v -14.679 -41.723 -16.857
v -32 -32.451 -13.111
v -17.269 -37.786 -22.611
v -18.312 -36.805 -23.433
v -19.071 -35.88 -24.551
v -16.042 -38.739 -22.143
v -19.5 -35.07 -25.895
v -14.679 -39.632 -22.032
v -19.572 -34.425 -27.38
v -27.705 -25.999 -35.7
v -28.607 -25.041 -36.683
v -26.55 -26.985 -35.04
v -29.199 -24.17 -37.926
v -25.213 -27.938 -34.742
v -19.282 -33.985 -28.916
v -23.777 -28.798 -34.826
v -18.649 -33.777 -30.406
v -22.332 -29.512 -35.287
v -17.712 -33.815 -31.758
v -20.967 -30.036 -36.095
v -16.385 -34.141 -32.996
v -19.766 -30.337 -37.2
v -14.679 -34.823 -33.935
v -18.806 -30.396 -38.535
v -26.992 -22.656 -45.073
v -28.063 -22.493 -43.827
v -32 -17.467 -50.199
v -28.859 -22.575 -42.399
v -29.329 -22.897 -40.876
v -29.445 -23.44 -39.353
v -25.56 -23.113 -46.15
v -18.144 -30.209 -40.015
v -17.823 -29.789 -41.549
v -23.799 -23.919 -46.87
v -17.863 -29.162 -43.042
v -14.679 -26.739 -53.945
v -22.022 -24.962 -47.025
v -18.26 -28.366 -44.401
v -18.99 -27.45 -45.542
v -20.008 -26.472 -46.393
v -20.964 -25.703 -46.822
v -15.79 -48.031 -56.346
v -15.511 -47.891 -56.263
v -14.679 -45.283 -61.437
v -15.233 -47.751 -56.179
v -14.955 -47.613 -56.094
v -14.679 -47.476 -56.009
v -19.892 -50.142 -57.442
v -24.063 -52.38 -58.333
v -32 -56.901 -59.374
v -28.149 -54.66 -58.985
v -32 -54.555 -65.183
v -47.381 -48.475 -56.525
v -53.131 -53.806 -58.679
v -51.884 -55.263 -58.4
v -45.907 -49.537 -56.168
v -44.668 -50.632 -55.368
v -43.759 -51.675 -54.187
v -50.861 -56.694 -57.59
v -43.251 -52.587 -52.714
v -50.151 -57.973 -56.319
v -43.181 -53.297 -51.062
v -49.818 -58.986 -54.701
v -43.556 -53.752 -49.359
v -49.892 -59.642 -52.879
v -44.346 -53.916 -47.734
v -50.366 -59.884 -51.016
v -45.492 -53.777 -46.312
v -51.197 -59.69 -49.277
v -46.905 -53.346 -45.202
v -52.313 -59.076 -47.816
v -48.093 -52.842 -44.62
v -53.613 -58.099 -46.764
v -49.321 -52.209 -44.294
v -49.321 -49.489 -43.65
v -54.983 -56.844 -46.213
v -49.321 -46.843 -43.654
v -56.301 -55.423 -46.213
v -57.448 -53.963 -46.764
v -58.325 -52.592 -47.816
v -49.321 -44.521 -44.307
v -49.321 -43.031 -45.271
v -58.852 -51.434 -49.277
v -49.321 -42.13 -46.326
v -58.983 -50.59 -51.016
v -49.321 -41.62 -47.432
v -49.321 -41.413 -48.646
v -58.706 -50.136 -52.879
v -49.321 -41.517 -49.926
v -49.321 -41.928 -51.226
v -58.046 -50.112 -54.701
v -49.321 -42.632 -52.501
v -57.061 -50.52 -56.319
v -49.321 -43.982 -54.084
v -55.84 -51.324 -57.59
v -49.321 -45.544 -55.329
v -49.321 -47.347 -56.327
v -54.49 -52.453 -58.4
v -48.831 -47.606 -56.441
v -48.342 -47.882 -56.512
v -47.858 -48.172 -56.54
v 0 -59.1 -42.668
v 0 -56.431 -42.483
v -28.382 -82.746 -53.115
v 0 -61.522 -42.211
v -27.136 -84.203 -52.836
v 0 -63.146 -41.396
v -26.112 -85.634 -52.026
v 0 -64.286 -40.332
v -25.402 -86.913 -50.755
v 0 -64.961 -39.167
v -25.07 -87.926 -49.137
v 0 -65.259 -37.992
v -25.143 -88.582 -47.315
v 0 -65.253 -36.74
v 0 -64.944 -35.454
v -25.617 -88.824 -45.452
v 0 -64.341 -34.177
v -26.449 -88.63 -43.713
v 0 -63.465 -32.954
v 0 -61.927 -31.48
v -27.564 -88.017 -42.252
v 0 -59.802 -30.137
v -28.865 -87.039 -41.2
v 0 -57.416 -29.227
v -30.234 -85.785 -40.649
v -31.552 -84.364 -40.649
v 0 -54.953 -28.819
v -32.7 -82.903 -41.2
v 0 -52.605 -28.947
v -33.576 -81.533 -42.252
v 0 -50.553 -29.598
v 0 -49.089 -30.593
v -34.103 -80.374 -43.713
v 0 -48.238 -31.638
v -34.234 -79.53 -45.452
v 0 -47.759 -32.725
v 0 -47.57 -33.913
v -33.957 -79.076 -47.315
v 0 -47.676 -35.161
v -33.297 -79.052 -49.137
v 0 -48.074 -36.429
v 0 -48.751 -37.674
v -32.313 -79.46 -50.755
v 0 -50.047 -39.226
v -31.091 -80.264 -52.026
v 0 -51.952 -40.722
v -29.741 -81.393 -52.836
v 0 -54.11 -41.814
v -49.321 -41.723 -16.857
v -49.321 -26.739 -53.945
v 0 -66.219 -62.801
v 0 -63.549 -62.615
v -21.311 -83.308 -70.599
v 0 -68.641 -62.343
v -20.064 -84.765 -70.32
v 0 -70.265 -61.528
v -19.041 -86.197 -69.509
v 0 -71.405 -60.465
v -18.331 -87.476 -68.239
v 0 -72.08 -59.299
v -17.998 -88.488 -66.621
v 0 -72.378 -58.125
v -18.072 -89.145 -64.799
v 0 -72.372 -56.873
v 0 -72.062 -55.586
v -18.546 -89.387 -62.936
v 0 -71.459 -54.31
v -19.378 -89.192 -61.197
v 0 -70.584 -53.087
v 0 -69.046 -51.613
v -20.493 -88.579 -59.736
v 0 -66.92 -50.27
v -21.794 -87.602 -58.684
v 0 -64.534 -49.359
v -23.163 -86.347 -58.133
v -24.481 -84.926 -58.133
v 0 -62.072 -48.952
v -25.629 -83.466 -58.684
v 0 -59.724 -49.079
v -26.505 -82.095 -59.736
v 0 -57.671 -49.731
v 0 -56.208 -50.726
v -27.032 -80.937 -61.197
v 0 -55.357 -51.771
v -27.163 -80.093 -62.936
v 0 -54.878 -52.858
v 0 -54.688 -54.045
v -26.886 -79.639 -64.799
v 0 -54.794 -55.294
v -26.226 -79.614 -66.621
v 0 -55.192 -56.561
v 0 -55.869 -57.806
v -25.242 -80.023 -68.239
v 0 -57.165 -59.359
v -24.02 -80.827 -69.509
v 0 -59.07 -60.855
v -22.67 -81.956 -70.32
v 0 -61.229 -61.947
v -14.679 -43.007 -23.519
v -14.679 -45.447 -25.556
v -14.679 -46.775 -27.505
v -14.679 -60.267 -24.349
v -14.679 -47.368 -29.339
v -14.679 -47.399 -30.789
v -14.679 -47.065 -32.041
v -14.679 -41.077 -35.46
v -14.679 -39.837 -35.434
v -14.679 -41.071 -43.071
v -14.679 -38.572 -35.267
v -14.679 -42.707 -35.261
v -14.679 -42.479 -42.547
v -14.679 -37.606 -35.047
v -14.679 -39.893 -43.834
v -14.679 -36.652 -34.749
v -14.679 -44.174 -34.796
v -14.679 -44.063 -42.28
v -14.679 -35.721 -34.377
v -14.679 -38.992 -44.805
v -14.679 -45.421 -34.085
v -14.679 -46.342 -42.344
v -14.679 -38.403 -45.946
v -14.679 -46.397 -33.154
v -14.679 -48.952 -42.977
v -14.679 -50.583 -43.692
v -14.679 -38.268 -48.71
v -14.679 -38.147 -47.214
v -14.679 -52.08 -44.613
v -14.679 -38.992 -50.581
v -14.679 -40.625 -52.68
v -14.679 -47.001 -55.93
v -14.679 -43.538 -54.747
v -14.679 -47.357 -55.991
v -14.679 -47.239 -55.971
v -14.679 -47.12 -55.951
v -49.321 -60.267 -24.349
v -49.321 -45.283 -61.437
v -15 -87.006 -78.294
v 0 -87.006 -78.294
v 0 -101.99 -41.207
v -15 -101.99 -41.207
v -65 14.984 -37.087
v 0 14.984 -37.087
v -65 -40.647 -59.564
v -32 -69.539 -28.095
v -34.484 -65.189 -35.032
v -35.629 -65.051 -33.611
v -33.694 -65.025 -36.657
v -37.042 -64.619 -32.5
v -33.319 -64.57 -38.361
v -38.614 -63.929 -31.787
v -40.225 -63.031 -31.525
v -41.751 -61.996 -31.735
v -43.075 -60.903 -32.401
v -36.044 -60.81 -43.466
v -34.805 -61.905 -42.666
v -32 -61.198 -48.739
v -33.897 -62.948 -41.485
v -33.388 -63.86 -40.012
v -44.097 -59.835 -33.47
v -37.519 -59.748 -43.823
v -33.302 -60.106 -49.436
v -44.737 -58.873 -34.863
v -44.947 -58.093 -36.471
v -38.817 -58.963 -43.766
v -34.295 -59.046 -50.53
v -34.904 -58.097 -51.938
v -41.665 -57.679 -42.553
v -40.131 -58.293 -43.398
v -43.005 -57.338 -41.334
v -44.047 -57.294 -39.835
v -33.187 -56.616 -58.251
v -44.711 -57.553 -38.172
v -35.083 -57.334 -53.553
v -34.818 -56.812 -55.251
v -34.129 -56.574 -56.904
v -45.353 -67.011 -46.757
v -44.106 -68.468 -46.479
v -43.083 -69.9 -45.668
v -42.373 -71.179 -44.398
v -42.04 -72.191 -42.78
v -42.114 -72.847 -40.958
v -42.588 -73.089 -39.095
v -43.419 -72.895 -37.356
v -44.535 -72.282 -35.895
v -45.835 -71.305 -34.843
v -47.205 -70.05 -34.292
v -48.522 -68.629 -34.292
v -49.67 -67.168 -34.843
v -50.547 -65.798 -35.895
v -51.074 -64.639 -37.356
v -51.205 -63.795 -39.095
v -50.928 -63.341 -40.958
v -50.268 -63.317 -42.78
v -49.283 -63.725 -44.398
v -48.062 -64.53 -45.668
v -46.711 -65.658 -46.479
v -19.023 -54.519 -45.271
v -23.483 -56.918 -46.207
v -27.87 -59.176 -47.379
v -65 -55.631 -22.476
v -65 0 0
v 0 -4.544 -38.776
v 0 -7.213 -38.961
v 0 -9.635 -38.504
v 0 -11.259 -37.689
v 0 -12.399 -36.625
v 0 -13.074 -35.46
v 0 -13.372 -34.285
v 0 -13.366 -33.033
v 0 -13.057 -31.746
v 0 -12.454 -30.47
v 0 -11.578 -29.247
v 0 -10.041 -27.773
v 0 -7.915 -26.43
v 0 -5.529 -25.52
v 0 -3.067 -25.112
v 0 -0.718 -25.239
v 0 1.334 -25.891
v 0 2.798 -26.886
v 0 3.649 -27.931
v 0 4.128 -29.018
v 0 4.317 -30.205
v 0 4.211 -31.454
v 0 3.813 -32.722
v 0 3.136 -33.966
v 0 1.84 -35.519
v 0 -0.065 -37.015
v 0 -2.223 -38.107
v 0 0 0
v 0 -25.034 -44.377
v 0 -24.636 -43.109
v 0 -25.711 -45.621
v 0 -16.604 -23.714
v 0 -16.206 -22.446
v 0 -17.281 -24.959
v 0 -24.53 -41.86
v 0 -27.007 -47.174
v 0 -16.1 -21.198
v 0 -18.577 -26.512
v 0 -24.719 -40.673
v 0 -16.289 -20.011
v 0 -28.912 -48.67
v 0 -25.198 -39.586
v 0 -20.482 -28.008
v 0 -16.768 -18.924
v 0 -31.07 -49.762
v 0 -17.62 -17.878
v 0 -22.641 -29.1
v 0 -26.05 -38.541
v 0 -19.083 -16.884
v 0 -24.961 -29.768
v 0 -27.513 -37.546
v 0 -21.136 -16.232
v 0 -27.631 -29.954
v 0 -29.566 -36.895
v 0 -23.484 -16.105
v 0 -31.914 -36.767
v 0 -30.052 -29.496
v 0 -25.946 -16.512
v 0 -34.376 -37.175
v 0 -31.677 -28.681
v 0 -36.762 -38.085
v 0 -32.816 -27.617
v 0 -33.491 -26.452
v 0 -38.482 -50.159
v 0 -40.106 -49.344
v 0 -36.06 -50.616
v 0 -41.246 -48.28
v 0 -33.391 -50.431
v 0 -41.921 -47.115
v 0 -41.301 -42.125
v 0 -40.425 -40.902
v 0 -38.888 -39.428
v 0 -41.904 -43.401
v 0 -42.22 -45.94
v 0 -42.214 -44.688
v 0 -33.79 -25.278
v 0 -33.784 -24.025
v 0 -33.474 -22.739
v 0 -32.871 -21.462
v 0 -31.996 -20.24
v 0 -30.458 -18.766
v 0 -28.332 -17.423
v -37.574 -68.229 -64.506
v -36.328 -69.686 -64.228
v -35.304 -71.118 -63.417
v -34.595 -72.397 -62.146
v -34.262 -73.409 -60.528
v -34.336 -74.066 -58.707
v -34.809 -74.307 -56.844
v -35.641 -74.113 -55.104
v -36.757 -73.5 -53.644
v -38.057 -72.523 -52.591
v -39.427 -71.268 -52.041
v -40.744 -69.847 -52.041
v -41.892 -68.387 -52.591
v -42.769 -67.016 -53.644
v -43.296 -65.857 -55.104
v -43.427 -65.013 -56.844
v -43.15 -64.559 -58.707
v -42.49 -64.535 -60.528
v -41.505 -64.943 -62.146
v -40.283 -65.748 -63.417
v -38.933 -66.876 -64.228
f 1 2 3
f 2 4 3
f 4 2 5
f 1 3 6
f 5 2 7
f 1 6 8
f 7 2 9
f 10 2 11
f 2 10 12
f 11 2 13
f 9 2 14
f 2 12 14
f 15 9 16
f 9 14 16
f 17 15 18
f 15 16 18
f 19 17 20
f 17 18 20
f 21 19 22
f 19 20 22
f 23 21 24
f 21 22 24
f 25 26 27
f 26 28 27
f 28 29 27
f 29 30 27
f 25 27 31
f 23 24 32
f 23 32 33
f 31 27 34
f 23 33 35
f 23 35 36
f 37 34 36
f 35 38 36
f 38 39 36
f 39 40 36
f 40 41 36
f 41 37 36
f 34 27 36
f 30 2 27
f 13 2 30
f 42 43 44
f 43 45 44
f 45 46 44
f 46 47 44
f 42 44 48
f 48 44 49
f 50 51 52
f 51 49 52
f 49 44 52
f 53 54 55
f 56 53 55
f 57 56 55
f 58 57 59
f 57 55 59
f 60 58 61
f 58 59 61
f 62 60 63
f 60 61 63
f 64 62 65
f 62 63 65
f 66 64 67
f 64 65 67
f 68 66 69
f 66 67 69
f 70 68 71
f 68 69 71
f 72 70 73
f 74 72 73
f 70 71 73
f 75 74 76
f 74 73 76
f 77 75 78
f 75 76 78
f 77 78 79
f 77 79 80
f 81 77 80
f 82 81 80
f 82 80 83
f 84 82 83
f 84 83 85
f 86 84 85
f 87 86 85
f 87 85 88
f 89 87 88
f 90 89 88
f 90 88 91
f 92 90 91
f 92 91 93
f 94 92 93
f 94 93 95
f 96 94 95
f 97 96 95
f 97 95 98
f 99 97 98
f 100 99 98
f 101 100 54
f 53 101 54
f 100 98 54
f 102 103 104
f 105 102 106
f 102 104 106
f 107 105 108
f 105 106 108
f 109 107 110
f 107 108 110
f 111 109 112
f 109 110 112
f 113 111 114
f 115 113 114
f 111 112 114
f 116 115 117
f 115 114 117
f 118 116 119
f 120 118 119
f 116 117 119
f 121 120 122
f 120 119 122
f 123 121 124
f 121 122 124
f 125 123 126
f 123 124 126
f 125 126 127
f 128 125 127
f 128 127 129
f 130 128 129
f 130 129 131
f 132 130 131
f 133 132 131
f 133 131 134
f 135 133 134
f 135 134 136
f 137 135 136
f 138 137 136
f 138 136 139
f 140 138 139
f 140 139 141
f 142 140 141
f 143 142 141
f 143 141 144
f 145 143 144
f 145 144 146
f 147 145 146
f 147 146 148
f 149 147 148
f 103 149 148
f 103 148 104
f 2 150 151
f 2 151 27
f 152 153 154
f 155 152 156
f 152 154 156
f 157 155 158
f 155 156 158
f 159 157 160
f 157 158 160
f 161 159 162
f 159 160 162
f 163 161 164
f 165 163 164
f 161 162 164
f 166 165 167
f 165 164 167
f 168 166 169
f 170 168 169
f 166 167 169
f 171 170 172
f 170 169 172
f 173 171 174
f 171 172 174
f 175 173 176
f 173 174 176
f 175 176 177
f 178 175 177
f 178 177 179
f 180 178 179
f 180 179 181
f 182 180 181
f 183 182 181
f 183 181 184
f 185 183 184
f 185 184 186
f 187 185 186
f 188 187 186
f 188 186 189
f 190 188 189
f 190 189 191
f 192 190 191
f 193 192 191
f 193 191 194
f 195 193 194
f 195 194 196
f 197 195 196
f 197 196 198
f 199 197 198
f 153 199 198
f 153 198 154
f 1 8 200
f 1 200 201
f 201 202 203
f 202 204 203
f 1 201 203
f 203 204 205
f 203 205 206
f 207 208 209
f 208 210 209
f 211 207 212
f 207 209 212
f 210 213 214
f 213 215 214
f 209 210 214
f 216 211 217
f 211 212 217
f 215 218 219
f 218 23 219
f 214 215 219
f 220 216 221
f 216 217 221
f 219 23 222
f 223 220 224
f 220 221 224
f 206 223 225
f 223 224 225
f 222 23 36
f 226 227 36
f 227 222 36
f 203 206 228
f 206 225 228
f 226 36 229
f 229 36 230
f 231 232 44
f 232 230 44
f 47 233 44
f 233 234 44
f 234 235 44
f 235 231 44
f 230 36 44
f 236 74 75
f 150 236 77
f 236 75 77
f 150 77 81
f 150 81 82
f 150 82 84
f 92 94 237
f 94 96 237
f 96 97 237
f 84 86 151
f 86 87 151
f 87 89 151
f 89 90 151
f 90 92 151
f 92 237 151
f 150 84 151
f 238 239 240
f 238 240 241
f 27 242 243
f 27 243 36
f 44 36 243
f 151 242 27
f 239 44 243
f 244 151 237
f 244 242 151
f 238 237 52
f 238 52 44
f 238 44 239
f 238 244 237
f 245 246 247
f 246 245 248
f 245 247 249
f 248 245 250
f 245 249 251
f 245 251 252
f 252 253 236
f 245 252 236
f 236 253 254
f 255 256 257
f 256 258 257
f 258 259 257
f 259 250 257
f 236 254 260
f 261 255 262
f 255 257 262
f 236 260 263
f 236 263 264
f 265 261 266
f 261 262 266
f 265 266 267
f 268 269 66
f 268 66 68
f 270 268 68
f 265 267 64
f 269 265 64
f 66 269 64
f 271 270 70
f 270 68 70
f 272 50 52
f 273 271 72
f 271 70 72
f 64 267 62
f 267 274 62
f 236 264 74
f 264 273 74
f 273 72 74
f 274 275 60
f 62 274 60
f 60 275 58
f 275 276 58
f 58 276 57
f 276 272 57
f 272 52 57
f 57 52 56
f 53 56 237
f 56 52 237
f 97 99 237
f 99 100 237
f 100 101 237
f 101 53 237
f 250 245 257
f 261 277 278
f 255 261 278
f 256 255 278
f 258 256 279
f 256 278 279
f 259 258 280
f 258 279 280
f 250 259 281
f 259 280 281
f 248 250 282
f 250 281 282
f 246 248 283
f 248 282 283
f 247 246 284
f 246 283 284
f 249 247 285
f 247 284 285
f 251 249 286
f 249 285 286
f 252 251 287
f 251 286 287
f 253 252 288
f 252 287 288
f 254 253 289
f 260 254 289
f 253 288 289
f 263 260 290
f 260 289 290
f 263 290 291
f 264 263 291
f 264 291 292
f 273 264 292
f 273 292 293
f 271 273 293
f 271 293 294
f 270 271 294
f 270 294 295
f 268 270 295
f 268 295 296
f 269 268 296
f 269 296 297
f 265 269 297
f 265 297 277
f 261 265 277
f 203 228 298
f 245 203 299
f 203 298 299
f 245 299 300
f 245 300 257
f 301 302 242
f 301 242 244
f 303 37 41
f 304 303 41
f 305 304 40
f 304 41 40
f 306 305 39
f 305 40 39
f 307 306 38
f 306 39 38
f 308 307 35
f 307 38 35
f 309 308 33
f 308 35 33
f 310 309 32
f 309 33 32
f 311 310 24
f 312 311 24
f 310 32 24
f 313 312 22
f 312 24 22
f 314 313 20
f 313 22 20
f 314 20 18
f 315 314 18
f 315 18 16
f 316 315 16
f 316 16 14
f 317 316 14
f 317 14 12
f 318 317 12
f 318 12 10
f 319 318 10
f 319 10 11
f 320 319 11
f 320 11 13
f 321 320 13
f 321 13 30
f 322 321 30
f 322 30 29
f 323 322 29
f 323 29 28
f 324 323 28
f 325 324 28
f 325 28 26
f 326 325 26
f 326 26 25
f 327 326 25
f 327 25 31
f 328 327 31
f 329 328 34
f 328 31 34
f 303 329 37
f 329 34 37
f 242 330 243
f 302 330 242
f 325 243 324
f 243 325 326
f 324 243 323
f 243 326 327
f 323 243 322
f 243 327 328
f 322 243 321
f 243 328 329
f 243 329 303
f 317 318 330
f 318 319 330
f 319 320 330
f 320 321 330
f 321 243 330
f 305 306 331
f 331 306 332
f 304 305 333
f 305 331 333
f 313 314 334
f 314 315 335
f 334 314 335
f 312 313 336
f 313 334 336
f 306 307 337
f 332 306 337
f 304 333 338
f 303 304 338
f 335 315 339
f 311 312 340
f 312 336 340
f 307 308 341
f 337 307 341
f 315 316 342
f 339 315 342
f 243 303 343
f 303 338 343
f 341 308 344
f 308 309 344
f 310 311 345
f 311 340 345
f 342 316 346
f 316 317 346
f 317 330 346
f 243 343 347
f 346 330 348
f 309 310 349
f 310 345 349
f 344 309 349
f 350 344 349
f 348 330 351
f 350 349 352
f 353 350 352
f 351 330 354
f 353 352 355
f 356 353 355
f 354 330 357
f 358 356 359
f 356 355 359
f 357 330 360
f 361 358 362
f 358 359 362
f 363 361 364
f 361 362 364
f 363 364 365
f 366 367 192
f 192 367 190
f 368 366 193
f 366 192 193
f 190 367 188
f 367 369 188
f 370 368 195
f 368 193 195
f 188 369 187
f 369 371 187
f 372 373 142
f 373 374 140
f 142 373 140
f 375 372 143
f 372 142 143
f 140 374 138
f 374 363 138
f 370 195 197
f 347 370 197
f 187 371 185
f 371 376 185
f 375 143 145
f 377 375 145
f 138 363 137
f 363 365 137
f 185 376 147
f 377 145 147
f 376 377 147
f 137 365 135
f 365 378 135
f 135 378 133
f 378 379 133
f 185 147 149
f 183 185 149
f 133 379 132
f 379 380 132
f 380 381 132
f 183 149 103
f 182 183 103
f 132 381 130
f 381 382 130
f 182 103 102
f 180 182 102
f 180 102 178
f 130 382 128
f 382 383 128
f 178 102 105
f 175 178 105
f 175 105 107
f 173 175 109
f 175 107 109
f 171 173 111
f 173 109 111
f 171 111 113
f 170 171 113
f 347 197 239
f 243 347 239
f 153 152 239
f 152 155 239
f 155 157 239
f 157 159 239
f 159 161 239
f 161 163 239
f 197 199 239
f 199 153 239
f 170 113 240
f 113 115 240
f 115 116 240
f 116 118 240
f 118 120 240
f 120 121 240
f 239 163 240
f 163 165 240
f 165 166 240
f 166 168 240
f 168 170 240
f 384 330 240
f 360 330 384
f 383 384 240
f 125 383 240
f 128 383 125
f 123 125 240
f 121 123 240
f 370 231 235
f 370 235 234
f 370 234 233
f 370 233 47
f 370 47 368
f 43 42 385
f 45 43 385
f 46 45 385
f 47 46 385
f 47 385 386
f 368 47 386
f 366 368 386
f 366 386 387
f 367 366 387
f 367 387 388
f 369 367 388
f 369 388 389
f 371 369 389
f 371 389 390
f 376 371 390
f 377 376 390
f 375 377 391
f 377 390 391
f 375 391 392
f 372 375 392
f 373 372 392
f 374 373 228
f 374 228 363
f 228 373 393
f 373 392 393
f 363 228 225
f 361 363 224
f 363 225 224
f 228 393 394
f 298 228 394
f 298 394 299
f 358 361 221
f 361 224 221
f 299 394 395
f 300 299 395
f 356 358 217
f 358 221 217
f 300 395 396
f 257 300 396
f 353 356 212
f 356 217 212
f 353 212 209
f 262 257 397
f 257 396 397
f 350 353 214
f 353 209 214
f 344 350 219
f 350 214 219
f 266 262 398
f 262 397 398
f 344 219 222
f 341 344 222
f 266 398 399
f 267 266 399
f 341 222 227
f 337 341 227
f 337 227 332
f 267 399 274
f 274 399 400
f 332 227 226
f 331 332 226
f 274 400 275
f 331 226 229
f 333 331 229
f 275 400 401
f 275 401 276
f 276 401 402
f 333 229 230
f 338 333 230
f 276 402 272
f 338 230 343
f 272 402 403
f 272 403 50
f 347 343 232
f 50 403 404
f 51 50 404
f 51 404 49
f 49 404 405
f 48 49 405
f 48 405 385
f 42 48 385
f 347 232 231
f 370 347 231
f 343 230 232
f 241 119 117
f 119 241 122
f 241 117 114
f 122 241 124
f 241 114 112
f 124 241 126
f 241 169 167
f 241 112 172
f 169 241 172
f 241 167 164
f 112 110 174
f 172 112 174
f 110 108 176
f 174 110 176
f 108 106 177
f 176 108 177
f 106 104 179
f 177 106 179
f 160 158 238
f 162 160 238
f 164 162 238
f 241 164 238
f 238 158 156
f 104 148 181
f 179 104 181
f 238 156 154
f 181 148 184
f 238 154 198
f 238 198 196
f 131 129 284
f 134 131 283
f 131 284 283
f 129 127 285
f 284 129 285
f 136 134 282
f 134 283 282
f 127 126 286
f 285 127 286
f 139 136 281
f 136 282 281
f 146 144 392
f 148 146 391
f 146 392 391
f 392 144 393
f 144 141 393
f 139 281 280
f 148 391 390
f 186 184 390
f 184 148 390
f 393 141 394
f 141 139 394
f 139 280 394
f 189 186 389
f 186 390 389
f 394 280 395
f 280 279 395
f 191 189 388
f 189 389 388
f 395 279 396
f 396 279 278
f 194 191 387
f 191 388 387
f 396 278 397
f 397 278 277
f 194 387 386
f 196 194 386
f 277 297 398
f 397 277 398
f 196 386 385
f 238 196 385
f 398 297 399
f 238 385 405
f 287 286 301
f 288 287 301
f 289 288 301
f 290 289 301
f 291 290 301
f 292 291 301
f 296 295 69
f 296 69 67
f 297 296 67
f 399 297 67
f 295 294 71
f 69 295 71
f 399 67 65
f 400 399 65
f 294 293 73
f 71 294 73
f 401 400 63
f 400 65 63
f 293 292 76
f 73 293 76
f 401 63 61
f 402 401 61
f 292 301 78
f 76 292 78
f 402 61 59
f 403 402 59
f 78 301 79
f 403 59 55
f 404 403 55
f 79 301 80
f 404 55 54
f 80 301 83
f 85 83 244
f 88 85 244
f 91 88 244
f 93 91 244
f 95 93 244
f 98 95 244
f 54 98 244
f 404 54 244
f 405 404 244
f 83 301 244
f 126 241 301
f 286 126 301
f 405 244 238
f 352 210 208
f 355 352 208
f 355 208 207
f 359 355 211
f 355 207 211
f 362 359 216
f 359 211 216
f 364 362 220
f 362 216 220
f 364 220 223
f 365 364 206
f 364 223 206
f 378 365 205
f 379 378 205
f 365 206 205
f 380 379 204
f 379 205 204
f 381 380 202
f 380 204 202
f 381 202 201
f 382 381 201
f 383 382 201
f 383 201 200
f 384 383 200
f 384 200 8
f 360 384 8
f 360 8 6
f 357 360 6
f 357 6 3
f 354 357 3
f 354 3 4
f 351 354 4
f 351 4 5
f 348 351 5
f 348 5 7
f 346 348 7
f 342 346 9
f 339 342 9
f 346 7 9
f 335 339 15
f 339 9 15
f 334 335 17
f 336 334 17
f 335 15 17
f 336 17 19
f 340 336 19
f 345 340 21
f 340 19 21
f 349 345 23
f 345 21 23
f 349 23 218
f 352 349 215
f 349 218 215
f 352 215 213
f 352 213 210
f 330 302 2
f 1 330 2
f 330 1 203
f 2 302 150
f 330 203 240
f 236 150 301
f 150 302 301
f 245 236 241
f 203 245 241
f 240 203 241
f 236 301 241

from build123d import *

# Parameters (mm, degrees)
SKETCH1_W           = 110
SKETCH1_H           = 65
BOSS_EXTRUDE1_DEPTH = 40
CHAMFER1_SIZE       = 50
SKETCH2_R           = 6.5
CUT_EXTRUDE1_DEPTH  = 99.212300536
CUT_EXTRUDE2_DEPTH  = 79.206210375


with BuildPart() as part:
    # Sketch1 → Boss-Extrude1 (new body)
    with BuildSketch(Plane(origin=(0, 0, 0), x_dir=(0, -0.927183855, -0.374606593), z_dir=(0, 0.374606593, -0.927183855))):
        with Locations((55, 32.5)):
            Rectangle(SKETCH1_W, SKETCH1_H)
    extrude(amount=BOSS_EXTRUDE1_DEPTH)

    # Chamfer1
    chamfer1_edges = [part.edges().sort_by_distance(p)[0] for p in [
        (-65, -94.498092134, -59.750402367),
    ]]
    chamfer(chamfer1_edges, length=CHAMFER1_SIZE)

    # Sketch2 → Cut-Extrude1 (cut, through all)
    with BuildSketch(Plane(origin=(-62.5, -57.94899091, -23.412912088), x_dir=(0.194241708, 0.180097776, -0.964279498), z_dir=(-0.707106781, -0.655617991, -0.264886862))):
        with Locations((24.302116706, 41.380596093)):
            Circle(SKETCH2_R)
        with Locations((36.115509488, 24.485515419)):
            Circle(SKETCH2_R)
        with Locations((17.709334516, 18.30387139)):
            Circle(SKETCH2_R)
        with Locations((30.072125815, 3.331851109)):
            Circle(SKETCH2_R)
        with Locations((42.43359242, 46.600709926)):
            Circle(SKETCH2_R)
    extrude(amount=-CUT_EXTRUDE1_DEPTH, mode=Mode.SUBTRACT)

    # Sketch3 → Cut-Extrude2 (cut, through all)
    with BuildSketch(Plane(origin=(0, 14.984263737, -37.087354183), x_dir=(0, -0.927183855, -0.374606593), z_dir=(0, 0.374606593, -0.927183855))):
        Polygon((45, 14.679491924), (65, 14.679491924), (75, 32), (65, 49.320508076), (45, 49.320508076), (35, 32), align=None)
    extrude(amount=-CUT_EXTRUDE2_DEPTH, mode=Mode.SUBTRACT)


solid = part.part
